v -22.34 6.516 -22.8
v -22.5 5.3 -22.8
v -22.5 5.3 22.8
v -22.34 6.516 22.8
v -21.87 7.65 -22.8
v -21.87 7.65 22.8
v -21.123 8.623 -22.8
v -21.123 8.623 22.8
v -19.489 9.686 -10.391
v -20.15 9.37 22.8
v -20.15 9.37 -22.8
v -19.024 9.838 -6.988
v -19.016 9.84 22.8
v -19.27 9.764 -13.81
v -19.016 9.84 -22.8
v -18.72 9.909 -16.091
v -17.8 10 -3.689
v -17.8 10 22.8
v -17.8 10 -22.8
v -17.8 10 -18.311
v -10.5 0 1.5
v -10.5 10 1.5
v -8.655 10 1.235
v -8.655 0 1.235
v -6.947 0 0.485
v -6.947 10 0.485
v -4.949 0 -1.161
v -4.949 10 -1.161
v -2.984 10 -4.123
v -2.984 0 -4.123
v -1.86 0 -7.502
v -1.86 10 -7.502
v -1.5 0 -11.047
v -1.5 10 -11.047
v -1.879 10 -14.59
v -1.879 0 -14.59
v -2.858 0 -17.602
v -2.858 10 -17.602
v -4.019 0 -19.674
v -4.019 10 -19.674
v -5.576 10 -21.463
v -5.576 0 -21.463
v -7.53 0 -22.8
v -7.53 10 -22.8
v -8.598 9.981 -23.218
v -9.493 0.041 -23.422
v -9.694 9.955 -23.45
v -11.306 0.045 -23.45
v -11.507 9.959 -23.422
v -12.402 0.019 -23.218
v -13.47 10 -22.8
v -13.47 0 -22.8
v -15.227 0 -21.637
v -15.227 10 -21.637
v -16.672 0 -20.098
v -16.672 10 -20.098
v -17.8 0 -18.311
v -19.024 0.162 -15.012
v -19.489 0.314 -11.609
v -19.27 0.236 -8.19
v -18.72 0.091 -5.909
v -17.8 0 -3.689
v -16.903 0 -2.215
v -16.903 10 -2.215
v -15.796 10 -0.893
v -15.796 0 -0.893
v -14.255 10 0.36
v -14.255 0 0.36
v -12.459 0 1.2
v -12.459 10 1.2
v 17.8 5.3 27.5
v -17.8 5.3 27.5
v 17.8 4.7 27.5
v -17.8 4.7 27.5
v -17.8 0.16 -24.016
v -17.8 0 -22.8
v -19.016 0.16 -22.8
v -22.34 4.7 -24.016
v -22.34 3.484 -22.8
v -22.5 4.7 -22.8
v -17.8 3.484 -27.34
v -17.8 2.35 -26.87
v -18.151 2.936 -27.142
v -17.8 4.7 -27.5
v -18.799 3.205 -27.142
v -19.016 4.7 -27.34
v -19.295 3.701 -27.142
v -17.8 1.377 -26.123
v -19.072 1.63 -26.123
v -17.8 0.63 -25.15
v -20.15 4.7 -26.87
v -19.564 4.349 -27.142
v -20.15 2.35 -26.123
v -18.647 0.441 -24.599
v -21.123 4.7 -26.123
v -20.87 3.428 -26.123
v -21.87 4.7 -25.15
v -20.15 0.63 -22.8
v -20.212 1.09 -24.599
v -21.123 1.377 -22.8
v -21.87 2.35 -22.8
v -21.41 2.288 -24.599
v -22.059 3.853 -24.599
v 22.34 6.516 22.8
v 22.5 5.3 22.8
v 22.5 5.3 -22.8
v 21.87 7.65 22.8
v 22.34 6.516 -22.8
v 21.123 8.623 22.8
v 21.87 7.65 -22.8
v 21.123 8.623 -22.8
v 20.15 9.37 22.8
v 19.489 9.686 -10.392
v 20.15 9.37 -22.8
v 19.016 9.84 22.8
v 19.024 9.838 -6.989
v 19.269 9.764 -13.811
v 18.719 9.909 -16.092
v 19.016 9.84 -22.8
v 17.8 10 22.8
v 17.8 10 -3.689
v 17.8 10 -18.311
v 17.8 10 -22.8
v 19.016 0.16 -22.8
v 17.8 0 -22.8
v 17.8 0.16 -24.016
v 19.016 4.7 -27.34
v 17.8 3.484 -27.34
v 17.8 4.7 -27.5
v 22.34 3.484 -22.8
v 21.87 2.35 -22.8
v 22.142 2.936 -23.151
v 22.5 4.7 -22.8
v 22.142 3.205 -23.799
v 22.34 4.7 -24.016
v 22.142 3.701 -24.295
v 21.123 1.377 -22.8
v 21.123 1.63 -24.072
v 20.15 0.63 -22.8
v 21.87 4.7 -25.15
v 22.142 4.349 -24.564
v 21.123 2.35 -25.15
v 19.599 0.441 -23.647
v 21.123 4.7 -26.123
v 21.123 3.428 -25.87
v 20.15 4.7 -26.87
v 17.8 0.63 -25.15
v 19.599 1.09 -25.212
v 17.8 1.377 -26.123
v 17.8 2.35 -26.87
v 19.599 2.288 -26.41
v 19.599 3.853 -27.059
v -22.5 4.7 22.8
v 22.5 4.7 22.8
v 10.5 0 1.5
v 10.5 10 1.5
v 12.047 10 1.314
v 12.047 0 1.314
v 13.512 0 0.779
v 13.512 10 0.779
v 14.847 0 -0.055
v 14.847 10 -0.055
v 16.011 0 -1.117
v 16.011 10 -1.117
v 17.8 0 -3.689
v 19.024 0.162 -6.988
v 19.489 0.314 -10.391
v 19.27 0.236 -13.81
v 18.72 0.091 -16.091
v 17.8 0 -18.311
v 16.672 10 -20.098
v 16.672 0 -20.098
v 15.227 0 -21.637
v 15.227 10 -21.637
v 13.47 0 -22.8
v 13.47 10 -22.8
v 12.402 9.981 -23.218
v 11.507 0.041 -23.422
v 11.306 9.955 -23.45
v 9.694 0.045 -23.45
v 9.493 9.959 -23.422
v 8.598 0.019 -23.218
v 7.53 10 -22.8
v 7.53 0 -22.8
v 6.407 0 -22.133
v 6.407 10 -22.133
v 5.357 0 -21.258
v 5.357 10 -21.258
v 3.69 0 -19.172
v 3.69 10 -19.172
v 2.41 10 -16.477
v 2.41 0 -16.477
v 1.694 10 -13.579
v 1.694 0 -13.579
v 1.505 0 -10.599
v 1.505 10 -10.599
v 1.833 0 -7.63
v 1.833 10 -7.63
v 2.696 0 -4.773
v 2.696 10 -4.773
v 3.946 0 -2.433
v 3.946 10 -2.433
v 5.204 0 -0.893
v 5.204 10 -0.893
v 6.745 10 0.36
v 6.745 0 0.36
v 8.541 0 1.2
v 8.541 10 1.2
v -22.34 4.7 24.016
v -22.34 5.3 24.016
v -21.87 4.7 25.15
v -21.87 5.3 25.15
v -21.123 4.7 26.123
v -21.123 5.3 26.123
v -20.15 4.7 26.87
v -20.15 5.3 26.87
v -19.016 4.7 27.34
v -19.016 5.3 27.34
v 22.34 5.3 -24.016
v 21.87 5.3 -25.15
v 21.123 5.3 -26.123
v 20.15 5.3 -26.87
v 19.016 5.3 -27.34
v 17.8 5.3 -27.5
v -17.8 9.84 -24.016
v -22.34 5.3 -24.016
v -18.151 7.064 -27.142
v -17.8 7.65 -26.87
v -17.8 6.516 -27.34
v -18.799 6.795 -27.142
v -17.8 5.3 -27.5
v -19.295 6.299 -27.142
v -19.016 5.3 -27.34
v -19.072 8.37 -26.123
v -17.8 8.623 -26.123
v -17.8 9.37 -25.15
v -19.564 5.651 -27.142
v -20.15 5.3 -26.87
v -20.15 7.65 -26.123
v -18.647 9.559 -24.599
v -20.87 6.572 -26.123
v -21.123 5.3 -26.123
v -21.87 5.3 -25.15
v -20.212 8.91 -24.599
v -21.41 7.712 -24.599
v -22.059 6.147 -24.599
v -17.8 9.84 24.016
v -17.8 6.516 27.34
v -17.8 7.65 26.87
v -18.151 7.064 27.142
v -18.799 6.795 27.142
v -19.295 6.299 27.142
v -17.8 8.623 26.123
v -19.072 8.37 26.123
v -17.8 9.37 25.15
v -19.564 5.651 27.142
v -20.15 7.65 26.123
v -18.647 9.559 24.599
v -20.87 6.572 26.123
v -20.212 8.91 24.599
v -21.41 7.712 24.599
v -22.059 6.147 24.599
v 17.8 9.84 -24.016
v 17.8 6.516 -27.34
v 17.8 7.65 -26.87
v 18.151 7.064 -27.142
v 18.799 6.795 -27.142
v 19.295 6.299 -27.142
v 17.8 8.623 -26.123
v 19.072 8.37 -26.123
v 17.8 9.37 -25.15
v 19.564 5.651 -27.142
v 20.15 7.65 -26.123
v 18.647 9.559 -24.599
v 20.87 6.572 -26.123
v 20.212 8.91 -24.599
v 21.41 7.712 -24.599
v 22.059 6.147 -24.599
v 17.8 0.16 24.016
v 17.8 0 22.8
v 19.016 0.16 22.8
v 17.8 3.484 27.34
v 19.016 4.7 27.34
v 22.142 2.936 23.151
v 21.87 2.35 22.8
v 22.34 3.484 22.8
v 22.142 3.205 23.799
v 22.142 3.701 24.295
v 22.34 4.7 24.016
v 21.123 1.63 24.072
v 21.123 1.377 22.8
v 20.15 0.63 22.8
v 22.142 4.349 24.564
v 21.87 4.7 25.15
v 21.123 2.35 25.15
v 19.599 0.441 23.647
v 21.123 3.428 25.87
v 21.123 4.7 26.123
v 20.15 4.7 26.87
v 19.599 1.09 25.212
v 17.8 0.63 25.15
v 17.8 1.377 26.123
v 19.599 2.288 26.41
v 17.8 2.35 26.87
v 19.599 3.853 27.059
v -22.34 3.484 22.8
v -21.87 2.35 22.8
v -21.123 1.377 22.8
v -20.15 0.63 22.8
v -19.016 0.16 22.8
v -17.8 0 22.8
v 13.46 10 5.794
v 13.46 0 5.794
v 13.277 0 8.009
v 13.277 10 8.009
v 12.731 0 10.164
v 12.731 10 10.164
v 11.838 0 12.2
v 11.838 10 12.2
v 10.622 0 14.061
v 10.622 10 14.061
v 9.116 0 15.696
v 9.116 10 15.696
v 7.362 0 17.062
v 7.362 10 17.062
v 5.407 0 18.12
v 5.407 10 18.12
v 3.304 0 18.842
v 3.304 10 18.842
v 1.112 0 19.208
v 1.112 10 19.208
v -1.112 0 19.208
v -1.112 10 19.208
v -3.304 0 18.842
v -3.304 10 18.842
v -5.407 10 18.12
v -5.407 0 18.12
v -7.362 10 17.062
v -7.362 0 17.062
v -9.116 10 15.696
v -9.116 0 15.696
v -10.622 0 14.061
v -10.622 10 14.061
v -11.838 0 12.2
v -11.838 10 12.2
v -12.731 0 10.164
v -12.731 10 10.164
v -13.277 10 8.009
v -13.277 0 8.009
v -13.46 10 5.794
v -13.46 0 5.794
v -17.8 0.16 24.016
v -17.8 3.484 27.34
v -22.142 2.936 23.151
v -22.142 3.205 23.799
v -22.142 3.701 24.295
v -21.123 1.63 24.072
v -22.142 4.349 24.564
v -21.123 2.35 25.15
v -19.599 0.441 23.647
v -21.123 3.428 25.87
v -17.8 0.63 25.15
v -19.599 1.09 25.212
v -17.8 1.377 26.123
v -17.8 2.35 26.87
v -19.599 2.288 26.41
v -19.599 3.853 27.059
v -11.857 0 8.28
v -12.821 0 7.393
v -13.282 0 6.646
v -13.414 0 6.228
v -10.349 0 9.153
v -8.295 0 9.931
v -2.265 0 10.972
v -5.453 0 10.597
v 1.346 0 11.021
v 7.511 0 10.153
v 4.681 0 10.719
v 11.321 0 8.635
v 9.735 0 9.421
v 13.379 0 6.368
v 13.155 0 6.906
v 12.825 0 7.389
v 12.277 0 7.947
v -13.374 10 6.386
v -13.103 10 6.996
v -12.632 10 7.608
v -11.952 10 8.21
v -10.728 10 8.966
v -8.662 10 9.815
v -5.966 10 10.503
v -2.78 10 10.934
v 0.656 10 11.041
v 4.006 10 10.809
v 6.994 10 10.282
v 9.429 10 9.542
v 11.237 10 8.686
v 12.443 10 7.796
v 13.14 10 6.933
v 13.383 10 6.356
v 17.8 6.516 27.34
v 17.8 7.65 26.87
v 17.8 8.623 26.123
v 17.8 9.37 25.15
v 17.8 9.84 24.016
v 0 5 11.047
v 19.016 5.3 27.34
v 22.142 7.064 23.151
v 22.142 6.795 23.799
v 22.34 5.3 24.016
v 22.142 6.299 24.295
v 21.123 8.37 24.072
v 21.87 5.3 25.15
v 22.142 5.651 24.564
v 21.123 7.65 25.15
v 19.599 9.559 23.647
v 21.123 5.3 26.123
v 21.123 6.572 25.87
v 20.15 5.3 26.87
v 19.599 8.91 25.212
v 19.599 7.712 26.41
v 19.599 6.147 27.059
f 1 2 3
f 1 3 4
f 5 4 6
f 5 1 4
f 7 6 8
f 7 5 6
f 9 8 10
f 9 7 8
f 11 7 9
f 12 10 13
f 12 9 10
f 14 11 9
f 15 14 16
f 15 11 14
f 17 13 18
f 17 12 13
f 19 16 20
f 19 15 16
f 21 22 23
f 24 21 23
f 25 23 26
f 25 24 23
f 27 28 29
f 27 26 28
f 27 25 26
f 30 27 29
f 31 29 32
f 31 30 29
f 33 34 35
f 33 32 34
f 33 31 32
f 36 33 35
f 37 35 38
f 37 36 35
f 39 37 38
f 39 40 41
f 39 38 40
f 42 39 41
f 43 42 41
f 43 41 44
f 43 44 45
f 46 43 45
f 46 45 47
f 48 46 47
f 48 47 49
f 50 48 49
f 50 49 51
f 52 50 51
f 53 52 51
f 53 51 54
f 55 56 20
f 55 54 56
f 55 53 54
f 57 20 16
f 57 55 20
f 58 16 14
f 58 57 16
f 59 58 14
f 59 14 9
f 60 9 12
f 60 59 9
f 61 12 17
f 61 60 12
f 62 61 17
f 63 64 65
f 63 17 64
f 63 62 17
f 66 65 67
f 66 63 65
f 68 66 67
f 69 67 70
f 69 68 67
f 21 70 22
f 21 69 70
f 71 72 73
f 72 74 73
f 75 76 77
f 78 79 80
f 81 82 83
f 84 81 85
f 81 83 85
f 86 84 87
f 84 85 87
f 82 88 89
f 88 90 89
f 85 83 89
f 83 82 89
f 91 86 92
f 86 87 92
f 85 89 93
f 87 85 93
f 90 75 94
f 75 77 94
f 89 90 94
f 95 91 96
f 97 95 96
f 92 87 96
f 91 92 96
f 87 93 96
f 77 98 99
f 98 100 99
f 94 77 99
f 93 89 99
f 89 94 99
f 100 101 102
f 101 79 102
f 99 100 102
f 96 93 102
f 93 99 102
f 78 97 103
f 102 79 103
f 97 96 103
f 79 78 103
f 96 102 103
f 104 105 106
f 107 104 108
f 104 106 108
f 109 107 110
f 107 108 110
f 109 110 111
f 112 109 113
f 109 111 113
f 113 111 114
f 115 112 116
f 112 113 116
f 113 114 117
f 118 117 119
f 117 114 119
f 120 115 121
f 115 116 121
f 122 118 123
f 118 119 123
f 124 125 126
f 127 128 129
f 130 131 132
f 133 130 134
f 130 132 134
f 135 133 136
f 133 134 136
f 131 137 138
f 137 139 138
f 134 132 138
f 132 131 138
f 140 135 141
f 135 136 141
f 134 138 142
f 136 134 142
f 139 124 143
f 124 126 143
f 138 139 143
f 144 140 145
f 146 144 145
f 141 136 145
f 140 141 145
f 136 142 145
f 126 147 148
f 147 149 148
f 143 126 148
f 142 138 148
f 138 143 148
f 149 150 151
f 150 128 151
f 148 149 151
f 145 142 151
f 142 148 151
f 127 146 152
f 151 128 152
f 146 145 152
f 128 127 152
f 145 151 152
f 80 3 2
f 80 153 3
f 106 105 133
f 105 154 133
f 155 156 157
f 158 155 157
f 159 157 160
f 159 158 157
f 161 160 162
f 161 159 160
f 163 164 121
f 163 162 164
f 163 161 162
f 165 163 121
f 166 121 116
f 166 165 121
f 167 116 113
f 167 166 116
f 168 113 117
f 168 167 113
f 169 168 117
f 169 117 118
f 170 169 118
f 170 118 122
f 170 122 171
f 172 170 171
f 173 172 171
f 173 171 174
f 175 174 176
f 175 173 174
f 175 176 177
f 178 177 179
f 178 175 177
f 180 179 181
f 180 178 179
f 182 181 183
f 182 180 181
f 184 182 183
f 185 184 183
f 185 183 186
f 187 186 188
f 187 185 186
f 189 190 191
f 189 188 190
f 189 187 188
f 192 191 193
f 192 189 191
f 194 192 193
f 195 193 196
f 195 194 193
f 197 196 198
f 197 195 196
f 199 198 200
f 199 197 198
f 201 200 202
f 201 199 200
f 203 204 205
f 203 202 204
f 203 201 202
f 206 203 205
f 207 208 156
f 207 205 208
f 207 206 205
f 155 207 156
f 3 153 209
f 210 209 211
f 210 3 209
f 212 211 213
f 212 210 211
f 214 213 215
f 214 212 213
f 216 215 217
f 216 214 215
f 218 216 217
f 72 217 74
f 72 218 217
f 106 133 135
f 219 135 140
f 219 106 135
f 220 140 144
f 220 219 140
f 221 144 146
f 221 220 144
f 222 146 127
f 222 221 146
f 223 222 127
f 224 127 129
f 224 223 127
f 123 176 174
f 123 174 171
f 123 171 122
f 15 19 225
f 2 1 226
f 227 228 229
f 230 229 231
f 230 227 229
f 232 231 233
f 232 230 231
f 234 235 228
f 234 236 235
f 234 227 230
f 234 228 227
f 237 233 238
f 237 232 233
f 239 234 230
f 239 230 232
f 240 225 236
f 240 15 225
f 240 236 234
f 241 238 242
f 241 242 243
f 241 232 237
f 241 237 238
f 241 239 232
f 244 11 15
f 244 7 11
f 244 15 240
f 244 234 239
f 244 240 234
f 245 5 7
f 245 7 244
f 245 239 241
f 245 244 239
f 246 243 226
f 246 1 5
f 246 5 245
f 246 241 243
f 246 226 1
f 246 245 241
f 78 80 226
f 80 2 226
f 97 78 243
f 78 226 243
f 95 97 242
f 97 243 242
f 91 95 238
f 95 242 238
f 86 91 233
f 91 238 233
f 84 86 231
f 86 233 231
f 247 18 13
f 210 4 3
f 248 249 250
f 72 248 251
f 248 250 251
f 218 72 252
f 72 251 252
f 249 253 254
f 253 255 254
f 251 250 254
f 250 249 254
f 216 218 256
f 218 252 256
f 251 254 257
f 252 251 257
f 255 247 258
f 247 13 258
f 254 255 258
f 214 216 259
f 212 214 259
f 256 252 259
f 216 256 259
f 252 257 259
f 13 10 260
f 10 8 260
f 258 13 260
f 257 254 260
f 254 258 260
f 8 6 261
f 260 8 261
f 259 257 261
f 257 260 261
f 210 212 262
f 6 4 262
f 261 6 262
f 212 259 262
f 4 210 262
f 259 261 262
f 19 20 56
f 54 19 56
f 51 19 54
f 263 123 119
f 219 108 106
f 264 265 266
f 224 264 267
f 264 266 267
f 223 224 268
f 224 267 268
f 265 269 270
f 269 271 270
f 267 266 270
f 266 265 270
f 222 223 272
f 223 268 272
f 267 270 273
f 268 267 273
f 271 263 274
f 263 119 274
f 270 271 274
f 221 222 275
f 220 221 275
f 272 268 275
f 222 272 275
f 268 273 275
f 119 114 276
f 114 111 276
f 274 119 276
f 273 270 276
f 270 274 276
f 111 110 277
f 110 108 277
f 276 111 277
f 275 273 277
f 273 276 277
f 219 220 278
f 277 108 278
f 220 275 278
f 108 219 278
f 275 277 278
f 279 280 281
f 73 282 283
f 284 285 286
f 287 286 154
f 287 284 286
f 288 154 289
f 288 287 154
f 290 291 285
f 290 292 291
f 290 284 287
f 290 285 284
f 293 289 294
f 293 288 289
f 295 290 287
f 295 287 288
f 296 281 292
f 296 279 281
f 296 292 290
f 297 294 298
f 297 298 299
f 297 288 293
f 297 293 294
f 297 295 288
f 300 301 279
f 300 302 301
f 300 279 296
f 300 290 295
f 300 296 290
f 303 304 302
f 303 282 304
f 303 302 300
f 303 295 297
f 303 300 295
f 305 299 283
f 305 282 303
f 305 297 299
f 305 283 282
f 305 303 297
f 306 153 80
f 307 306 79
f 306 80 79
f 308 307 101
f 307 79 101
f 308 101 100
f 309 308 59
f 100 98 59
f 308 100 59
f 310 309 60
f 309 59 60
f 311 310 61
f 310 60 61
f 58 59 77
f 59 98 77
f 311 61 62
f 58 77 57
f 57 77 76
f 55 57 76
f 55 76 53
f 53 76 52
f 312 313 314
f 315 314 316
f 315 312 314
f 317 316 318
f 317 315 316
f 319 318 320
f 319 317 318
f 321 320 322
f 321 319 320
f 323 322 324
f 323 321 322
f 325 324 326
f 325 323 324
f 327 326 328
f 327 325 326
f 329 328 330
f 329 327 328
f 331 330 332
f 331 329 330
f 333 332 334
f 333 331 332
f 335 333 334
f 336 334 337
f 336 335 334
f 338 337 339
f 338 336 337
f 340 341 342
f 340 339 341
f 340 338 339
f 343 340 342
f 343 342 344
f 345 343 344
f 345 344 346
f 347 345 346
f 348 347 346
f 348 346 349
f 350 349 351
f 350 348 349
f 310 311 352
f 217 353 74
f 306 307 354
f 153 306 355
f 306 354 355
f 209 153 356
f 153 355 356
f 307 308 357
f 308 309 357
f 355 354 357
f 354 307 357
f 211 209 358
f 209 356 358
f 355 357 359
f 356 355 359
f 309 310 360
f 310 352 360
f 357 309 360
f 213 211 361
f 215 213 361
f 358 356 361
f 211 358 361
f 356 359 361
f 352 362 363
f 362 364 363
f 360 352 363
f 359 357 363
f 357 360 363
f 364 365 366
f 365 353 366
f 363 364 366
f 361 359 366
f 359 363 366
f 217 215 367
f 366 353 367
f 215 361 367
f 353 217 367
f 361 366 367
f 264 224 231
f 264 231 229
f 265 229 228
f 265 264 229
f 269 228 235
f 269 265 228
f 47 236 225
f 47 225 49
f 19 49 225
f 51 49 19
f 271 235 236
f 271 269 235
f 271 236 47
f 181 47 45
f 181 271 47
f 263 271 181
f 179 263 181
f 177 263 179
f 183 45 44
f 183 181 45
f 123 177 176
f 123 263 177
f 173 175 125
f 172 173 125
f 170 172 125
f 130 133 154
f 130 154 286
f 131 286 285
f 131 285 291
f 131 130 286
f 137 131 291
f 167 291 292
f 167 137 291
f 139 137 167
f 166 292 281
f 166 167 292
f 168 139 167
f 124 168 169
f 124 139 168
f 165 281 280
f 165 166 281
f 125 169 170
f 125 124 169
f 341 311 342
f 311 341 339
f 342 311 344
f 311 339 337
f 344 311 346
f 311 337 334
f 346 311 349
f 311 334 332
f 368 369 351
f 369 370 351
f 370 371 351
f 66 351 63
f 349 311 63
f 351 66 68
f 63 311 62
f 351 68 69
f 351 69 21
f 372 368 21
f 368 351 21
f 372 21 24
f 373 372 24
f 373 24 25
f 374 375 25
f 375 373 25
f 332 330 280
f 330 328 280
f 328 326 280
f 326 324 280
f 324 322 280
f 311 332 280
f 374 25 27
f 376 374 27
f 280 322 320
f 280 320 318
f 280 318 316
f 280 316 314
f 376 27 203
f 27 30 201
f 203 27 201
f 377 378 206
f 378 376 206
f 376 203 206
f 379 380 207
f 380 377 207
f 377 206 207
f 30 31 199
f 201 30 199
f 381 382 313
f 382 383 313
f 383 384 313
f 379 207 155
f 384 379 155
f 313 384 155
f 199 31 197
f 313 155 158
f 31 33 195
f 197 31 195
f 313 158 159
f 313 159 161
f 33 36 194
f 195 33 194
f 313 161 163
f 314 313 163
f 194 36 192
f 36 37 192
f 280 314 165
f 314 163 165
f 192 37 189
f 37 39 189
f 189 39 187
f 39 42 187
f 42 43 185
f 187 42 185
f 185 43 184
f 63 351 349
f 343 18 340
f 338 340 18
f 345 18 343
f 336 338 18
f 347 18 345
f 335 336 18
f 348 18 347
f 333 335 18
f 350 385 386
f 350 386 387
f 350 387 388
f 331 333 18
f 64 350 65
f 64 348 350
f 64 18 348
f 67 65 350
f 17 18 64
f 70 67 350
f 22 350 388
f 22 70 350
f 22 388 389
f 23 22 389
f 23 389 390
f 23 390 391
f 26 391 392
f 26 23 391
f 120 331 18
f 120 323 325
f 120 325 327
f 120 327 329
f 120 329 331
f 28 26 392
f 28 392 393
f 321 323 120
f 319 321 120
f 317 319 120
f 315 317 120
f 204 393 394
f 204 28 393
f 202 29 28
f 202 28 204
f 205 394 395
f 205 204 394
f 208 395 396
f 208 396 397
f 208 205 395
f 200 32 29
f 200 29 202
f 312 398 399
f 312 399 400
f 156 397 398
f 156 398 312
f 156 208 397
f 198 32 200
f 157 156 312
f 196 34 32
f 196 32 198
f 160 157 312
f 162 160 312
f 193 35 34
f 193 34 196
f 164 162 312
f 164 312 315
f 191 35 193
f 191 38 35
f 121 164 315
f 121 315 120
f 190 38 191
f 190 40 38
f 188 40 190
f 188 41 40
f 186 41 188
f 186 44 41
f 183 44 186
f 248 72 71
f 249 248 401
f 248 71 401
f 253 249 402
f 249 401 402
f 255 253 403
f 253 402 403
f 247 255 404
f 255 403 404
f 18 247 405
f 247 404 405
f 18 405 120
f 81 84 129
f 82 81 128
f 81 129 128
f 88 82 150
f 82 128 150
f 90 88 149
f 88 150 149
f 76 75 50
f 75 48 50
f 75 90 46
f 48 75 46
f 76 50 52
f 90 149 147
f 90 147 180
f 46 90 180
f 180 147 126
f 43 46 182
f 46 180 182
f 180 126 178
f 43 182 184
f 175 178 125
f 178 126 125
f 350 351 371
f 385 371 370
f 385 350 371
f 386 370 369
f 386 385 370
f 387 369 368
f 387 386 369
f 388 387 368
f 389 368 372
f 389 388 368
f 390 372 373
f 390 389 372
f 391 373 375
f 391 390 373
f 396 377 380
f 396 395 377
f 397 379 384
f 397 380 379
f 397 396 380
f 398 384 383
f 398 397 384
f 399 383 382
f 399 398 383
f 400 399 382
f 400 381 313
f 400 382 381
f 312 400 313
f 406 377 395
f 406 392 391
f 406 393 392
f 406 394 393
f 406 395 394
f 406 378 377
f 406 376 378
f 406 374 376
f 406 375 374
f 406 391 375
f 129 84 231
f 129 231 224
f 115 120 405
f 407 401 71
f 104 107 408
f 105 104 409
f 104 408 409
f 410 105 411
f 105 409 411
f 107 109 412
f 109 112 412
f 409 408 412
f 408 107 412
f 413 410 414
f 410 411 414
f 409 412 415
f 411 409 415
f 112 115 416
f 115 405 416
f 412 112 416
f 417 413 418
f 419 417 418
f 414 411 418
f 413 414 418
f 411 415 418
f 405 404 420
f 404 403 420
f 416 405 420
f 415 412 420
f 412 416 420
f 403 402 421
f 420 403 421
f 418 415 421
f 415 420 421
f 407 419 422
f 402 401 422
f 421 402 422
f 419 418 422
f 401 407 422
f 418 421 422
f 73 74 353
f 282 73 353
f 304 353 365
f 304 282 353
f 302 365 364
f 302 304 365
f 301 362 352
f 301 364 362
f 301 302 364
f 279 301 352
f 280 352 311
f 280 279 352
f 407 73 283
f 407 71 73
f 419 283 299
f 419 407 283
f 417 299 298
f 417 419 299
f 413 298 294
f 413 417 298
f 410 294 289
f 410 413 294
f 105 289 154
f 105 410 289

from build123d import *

# Parameters (mm, degrees)
SCHIZZO1_W                    = 45
SCHIZZO1_H                    = 55
ESTRUSIONE_ESTRUSIONE1_DEPTH  = 10
RACCORDO1_R                   = 4.7
TAGLIO_ESTRUSIONE3_DEPTH      = 20
TAGLIO_ESTRUSIONE3_DEPTH_BACK = 20
SCHIZZO3_RX                   = 12.5
SCHIZZO3_RY                   = 9
TAGLIO_ESTRUSIONE4_DEPTH      = 20


with BuildPart() as part:
    # Schizzo1 → Estrusione-Estrusione1 (new body)
    with BuildSketch(Plane(origin=(0, 0, 0), x_dir=(1, 0, 0), z_dir=(0, 1, 0))):
        Rectangle(SCHIZZO1_W, SCHIZZO1_H)
    extrude(amount=ESTRUSIONE_ESTRUSIONE1_DEPTH)

    # Raccordo1
    raccordo1_edges = [part.edges().sort_by_distance(p)[0] for p in [
        (-22.5, 10, 0),
        (0, 10, 27.5),
        (22.5, 10, 0),
        (0, 0, 27.5),
        (-22.5, 0, 0),
        (0, 0, -27.5),
        (22.5, 0, 0),
        (0, 10, -27.5),
        (22.5, 5, 27.5),
        (-22.5, 5, 27.5),
        (-22.5, 5, -27.5),
        (22.5, 5, -27.5),
    ]]
    fillet(raccordo1_edges, radius=RACCORDO1_R)

    # Schizzo3 → Taglio-Estrusione3 (cut, two sides: drawn at the far end of the back side and taken through both)
    with BuildSketch(Plane(origin=(0, 10, 0), x_dir=(1, 0, 0), z_dir=(0, 1, 0)).offset(-TAGLIO_ESTRUSIONE3_DEPTH_BACK)):
        with Locations(Location((-10.5, 11), (0, 0, -90))):
            Ellipse(SCHIZZO3_RX, SCHIZZO3_RY)
        with Locations(Location((10.5, 11), (0, 0, -90))):
            Ellipse(SCHIZZO3_RX, SCHIZZO3_RY)
    extrude(amount=TAGLIO_ESTRUSIONE3_DEPTH + TAGLIO_ESTRUSIONE3_DEPTH_BACK, mode=Mode.SUBTRACT)

    # Schizzo4 → Taglio-Estrusione4 (cut)
    with BuildSketch(Plane(origin=(0, 10, 0), x_dir=(1, 0, 0), z_dir=(0, 1, 0))):
        with BuildLine():
            ThreePointArc((13.460158557, -5.793503536), (0, -19.253662092), (-13.460158557, -5.793503536))
            add(Edge.make_bspline(
                [(-13.460158557, -5.793503536), (-13.460158557, -11.046920102), (0, -11.046920102), (13.460158557, -11.046920102), (13.460158557, -5.793503536)],
                knots=[0, 0, 0, 1.570796327, 1.570796327, 3.141592654, 3.141592654, 3.141592654], degree=2, weights=[1, 0.707106781, 1, 0.707106781, 1]))
        make_face()
    extrude(amount=-TAGLIO_ESTRUSIONE4_DEPTH, mode=Mode.SUBTRACT)


solid = part.part
